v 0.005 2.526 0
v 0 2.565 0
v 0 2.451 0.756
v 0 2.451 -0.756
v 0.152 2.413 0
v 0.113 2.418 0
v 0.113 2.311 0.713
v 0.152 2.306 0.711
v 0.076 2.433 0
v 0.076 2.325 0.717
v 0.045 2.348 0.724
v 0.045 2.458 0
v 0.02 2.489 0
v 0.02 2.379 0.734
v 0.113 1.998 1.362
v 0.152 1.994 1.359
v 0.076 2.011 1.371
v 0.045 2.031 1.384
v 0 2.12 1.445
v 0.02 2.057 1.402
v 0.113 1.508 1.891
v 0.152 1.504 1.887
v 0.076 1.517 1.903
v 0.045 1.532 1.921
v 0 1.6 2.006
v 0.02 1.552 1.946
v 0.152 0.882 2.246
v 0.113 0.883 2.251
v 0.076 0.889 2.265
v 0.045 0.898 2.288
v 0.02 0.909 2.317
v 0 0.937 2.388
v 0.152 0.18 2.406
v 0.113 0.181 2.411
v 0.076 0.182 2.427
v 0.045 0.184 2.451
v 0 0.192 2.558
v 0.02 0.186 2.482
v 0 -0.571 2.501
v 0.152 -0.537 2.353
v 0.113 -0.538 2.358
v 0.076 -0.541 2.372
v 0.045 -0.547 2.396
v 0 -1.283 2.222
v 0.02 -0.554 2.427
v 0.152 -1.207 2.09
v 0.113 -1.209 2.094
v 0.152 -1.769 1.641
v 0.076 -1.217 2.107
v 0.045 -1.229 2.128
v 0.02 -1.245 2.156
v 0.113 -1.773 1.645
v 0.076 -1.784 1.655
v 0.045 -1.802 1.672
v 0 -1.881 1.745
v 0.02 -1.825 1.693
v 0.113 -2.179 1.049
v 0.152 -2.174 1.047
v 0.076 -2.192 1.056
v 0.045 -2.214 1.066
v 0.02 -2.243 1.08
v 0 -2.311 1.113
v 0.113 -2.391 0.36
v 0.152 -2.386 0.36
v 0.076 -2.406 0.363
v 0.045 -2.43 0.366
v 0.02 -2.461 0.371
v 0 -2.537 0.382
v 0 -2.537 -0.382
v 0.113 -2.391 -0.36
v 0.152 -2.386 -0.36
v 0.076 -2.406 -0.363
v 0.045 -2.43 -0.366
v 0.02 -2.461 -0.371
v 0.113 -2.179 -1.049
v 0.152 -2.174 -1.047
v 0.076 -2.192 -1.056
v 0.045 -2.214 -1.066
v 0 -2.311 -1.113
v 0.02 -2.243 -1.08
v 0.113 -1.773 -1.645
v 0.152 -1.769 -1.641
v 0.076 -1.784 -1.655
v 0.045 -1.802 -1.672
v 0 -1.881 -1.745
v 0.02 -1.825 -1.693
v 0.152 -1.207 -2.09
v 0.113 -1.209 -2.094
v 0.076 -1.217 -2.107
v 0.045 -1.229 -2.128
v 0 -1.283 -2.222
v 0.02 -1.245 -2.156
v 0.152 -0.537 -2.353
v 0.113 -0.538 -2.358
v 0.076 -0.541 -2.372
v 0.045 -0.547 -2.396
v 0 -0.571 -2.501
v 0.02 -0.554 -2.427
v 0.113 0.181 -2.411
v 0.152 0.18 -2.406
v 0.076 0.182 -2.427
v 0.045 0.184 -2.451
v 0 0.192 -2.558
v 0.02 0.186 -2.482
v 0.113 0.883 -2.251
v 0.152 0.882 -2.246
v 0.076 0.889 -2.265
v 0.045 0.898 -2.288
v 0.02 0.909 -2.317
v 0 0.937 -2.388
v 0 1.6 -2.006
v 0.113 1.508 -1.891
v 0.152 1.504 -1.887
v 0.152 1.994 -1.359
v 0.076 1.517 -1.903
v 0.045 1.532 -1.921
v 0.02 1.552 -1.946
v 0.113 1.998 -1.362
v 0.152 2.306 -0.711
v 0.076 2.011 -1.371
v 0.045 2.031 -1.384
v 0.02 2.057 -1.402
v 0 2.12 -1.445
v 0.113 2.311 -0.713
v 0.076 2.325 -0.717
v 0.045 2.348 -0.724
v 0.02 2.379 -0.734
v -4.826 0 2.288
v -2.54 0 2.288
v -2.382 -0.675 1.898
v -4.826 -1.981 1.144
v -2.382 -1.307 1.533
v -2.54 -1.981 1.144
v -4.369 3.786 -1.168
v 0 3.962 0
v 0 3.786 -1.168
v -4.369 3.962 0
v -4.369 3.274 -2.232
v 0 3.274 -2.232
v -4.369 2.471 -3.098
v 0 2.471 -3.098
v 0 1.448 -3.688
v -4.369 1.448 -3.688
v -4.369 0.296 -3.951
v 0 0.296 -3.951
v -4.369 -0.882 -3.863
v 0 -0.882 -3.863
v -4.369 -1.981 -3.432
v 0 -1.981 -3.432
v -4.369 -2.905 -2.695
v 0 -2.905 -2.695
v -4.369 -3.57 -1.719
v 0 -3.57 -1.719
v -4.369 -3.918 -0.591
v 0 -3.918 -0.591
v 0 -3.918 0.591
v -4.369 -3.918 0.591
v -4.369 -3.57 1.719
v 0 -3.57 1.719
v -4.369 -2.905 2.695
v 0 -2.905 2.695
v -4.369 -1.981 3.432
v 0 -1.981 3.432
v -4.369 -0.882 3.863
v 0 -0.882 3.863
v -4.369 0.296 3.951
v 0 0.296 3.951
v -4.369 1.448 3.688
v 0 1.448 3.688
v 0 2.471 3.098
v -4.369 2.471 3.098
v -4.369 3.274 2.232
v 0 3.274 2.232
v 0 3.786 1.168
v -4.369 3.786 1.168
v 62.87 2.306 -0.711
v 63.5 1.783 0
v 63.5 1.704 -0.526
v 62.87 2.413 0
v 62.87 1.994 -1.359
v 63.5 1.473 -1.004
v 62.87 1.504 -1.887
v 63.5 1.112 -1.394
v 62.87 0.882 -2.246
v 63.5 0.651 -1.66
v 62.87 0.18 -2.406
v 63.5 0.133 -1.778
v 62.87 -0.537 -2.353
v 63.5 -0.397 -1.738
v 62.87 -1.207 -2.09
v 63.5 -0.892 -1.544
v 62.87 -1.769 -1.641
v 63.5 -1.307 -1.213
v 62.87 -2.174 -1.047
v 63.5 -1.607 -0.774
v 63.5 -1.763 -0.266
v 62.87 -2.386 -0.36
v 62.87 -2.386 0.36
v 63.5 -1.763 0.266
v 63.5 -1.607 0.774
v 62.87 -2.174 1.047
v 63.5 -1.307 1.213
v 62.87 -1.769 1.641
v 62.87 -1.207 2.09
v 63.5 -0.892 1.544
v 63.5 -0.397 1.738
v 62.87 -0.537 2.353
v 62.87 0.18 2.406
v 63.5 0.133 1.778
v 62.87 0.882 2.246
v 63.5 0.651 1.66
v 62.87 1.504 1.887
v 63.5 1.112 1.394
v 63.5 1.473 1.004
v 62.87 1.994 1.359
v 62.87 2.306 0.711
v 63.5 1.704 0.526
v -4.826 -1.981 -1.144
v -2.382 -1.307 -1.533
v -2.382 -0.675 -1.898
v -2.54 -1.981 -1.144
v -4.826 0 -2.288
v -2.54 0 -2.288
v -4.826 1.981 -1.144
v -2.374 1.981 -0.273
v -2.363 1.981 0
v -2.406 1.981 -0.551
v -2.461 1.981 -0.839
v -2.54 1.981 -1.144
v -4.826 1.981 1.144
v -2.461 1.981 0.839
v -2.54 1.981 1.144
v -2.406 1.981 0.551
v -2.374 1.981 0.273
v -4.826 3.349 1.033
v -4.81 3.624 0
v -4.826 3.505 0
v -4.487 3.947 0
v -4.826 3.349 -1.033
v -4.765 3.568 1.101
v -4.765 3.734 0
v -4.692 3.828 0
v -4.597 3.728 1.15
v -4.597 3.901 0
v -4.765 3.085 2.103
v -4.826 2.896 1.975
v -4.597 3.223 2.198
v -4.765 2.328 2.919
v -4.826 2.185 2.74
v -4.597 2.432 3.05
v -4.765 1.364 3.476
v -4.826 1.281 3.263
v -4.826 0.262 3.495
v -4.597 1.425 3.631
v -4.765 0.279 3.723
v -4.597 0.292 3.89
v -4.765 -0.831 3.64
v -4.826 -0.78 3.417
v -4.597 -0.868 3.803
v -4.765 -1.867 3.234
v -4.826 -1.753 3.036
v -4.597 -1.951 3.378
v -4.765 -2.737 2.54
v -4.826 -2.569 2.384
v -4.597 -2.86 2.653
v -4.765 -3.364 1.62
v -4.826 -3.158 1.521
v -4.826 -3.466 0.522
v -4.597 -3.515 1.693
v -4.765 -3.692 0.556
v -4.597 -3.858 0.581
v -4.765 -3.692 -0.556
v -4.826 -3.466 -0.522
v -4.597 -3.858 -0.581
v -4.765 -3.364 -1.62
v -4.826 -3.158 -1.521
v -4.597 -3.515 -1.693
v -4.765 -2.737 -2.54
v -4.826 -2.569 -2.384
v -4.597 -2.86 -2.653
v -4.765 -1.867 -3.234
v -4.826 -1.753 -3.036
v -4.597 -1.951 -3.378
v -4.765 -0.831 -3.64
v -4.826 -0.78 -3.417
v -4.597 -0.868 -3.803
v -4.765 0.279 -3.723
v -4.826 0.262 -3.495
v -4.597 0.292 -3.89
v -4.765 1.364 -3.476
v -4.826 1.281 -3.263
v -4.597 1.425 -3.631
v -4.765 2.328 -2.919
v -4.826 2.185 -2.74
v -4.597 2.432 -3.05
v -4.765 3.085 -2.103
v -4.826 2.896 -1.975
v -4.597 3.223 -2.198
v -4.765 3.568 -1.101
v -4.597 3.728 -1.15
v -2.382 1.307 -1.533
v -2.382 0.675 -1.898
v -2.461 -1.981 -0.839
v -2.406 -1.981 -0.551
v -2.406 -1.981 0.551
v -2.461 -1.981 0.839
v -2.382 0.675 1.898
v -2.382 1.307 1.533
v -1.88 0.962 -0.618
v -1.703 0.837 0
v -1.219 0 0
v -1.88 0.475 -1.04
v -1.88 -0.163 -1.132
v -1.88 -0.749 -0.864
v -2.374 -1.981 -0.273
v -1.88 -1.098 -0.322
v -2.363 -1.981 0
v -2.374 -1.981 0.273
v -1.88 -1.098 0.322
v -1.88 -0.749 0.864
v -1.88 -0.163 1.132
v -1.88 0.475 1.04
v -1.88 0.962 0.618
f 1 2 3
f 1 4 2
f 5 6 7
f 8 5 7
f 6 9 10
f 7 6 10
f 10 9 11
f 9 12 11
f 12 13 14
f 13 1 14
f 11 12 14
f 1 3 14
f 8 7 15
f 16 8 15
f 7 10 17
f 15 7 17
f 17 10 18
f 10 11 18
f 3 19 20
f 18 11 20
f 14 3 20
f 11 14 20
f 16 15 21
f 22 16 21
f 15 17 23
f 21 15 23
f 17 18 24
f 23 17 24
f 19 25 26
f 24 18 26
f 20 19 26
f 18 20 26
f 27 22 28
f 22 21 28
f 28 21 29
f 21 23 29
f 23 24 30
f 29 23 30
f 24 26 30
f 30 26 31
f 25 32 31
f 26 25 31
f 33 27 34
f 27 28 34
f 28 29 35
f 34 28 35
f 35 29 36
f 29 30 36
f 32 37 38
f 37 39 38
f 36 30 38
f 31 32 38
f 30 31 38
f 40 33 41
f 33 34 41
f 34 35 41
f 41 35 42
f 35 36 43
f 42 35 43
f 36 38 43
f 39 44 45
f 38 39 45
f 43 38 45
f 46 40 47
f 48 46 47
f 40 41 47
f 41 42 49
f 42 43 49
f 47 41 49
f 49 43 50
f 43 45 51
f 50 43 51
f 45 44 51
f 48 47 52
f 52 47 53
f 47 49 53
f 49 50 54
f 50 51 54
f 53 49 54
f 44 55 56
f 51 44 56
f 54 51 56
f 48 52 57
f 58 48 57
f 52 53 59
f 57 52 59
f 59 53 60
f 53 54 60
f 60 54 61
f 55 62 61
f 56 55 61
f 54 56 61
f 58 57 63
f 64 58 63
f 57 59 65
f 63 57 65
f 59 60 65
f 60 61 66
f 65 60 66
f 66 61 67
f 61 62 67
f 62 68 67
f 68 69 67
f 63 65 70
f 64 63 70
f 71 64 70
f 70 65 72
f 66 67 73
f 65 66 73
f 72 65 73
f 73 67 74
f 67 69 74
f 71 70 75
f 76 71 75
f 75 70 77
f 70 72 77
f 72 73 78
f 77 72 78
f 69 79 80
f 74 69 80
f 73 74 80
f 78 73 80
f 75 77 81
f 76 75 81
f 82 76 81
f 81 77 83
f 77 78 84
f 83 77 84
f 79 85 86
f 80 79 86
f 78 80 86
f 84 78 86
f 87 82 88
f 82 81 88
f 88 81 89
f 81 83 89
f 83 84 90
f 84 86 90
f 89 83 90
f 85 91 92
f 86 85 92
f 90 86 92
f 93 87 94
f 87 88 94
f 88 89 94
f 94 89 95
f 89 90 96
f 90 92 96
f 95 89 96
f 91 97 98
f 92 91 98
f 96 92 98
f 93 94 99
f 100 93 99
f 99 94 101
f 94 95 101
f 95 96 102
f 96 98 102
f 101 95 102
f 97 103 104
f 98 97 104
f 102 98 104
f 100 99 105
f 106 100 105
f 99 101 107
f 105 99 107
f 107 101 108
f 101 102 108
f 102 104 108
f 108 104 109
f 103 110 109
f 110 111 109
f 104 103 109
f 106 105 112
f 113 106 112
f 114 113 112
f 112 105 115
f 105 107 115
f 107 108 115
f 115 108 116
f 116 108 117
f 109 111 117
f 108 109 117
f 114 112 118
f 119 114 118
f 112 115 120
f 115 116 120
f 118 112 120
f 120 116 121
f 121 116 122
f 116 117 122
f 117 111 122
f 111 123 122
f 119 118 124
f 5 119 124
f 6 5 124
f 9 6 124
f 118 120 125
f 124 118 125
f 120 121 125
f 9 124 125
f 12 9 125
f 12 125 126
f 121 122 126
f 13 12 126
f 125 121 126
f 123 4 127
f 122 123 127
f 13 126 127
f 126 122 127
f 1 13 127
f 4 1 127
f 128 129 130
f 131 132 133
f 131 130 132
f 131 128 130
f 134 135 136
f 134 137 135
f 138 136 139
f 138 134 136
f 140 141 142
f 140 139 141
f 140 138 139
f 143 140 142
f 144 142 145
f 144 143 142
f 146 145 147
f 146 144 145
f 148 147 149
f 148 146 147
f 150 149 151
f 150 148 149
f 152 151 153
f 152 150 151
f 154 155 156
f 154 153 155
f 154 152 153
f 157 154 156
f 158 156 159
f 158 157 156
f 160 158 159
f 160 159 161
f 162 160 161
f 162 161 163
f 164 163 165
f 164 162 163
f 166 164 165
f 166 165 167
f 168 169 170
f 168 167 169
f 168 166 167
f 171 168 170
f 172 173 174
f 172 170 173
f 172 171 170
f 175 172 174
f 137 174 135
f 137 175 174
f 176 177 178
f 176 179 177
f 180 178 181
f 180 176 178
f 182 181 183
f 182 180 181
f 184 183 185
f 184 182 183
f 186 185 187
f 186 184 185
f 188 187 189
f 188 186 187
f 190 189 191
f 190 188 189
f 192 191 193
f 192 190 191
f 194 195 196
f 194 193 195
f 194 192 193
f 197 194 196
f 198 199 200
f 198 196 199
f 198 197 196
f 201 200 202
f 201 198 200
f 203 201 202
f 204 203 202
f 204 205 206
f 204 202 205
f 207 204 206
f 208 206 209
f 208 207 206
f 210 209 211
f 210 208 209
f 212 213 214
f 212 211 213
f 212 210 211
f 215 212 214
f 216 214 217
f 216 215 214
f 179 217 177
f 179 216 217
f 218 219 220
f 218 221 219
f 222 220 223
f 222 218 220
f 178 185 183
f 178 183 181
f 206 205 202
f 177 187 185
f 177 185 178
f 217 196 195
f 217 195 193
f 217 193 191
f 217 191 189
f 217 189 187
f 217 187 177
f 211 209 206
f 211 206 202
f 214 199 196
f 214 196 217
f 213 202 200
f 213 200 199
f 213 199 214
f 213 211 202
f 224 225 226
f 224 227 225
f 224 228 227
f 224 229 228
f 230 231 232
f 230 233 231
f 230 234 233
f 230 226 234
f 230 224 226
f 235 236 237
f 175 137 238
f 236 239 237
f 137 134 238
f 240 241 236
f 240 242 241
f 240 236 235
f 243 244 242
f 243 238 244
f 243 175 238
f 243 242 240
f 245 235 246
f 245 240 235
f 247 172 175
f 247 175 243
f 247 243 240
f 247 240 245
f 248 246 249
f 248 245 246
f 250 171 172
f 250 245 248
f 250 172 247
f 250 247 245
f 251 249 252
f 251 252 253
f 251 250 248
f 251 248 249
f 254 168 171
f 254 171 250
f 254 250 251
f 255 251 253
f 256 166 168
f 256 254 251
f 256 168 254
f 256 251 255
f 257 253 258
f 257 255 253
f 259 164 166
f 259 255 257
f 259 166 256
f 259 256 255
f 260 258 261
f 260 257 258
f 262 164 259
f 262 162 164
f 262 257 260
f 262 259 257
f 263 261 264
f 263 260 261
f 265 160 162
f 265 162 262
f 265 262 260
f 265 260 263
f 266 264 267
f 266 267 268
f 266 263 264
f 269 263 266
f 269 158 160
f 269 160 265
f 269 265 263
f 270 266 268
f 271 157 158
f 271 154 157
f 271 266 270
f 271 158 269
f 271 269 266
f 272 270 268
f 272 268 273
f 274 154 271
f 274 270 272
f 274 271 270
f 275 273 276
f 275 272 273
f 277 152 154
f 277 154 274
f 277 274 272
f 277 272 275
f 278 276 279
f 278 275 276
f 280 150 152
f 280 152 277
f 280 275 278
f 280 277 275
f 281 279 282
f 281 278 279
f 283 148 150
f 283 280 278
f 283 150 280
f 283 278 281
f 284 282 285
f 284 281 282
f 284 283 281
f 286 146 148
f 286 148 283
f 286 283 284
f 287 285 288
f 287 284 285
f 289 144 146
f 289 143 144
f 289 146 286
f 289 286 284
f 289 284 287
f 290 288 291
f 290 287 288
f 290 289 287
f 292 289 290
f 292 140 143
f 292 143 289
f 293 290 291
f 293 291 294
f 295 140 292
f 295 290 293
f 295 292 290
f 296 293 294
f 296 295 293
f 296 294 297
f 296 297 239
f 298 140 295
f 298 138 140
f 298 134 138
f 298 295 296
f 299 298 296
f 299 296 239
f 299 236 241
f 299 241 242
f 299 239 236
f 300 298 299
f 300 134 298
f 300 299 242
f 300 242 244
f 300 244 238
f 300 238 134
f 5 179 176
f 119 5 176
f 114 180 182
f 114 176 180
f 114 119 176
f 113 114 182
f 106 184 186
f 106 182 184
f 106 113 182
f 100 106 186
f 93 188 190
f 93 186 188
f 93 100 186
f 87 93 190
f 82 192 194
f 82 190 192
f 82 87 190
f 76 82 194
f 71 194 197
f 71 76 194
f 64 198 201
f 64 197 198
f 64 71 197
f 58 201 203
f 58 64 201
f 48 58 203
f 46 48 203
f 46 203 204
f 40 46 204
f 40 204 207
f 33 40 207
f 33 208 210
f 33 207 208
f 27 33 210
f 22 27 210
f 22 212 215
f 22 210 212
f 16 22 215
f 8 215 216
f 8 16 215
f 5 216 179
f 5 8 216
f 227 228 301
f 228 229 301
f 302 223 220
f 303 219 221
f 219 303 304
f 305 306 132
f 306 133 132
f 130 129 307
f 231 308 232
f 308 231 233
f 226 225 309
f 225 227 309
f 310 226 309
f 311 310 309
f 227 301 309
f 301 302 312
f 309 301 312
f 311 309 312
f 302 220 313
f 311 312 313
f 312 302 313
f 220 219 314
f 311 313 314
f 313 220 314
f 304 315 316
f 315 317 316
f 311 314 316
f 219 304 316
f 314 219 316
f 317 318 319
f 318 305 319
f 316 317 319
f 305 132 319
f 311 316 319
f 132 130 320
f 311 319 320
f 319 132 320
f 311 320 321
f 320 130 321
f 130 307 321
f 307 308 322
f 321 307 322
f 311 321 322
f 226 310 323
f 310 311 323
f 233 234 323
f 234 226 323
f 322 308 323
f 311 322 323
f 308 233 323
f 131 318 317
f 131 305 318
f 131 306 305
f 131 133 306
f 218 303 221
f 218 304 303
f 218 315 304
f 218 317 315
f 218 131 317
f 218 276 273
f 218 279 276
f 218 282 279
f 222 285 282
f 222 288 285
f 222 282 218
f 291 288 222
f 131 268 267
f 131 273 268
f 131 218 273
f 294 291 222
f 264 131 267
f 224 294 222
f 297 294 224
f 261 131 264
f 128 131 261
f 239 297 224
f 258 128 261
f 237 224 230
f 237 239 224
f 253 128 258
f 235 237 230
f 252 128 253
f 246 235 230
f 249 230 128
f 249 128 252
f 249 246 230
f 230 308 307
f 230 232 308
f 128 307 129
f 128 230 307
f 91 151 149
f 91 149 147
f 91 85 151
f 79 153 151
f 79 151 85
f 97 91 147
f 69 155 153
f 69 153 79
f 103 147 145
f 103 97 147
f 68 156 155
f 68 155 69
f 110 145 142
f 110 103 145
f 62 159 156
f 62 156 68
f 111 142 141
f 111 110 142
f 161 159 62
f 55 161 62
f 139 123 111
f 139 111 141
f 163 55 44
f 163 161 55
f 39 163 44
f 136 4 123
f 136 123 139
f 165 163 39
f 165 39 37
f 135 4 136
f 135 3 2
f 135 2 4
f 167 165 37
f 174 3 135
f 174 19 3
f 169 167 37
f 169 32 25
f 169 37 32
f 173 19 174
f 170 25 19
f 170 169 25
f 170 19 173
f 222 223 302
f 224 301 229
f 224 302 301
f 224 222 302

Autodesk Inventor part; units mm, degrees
ref_plane "YZ Plane" through (0, 0, 0) normal (1, 0, 0) x (0, 1, 0)
ref_plane "XZ Plane" through (0, 0, 0) normal (0, 1, 0) x (-1, 0, 0)
sketch "Sketch1" plane through (0, 0, 0) normal (0, 0, 1) x (1, 0, 0)
  line L0 (-1.2192, 0) -> (63.5, 0)
  line L1 (63.5, 0) -> (63.5, 2.413)
  line L2 (63.5, 2.413) -> (35.052, 2.413)
  line L3 (35.052, 2.413) -> (32.406, 2.413)
  line L4 (32.406, 2.413) -> (0, 2.413)
  line L5 (0, 2.413) -> (0, 3.9624)
  line L6 (0, 3.9624) -> (-4.826, 3.9624)
  line L7 (-4.826, 3.9624) -> (-4.826, 2.2877)
  line L8 (-4.826, 2.2877) -> (-2.54, 2.2877)
  line L9 (-2.54, 2.2877) -> (-1.2192, 0)
  line L10 (-18.4912, 0) -> (77.1652, 0) projected
  line L11 (0, -0.7925) -> (0, 4.7549) projected
  line L12 (35.052, 2.413) -> (0, 2.413) construction
  dimension "d1" = 28.448
  dimension "d2" = 2.646
  dimension "d3" = 4.826
  dimension "d4" = 2.286
  dimension "d5" = 60
  dimension "d6" = 4.826
  dimension "d7" = 4.826
  dimension "d8" = 4.5754
  dimension "d9" = 7.9248
  dimension "d26" = 63.5
revolve "Body" add sketch "Sketch1" angle 360 about axis through (-1.2192, 0, 0) along (1, 0, 0)
sketch "Sketch2" plane through (-4.826, 0, 0) normal (-1, 0, 0) x (0, 0, 1)
  circle A0 centre (0, 0) radius 2.2877 projected
  line L0 (0, -5.5474) -> (0, 5.5474) projected
  line L1 (-5.5474, 0) -> (5.5474, 0) projected
  line L2 (2.2877, 0) -> (1.1438, -1.9812)
  line L3 (1.1438, -1.9812) -> (-1.1438, -1.9812)
  line L4 (-1.1438, -1.9812) -> (-2.2877, 0)
  line L5 (-2.2877, 0) -> (-1.1438, 1.9812)
  line L6 (-1.1438, 1.9812) -> (1.1438, 1.9812)
  line L7 (1.1438, 1.9812) -> (2.2877, 0)
extrude "Slot" add sketch "Sketch2" against normal up to next contours L7 A0 | A0 L2 | L6 L0 A0 | A0 L0 L3 | L0 L6 A0 | A0 L3 L0 | L4 A0 | A0 L5
fillet "Fillet1" radius 0.4572 1 edges at (-4.826, -3.9624, 0)
thread "Thread" size "10-24 UNC" class "2A" standard "ANSI Unified Screw Threads" length 28.448
chamfer "Chamfer1" distance 0.6299 distance2 0.6299 1 edges at (63.5, -2.413, 0) measured on face at (63.5, -0.9495, -0.1286)
ref_plane "Work Plane1" through (29, 0, 0) normal (0, -1, 0) x (1, 0, 0)
fillet "Fillet2" radius 0.1524 1 edges at (0, -2.413, 0)
equation "\"d1\" = GEL"
equation "\"d3\" = KOH"
equation "\"d4\" = INTI"
equation "\"d6\" = GD"
equation "\"d7\" = BDM"
equation "\"d8\" = 1.1547 * SW"
equation "\"d9\" = KOD"
equation "\"d26\" = NLG"
equation "\"d30\" = R"
equation "\"d17\" = RR"
equation "\"d13\" = GEL"
equation "\"d15\" = -0.5 * SPD + 0.5 * GD"
equation "\"d16\" = GUL"
equation "\"GD\" = 4.826"
equation "\"NLG\" = 63.5"
equation "\"GEL\" = 28.448"
equation "\"KOD\" = 7.9248"
equation "\"KOH\" = 4.826"
equation "\"INTI\" = 2.286"
equation "\"GAL\" = 2.64592"
equation "\"GUL\" = 0.62992"
equation "\"BDM\" = 4.826"
equation "\"SW\" = 3.9624"
equation "\"RR\" = 0.4572"
equation "\"SPD\" = 3.56616"
equation "\"R\" = 0.1524"
equation "\"PHH\" = 0.127"
equation "\"GD1\" = SPD"
equation "\"THREADDIA\" = 4.826"
equation "\"FAWI\" = 45deg"
equation "\"KOH1\" = 4.3434"
equation "\"NND\" = 4.826"
equation "\"TOA\" = 30deg"
equation "\"E0\" = 1.155 * SW"
properties part number "ANSI B18.3 - No. 10 - 24 UNC - 2 1/2 HS HCS" material "Steel, Mild"
